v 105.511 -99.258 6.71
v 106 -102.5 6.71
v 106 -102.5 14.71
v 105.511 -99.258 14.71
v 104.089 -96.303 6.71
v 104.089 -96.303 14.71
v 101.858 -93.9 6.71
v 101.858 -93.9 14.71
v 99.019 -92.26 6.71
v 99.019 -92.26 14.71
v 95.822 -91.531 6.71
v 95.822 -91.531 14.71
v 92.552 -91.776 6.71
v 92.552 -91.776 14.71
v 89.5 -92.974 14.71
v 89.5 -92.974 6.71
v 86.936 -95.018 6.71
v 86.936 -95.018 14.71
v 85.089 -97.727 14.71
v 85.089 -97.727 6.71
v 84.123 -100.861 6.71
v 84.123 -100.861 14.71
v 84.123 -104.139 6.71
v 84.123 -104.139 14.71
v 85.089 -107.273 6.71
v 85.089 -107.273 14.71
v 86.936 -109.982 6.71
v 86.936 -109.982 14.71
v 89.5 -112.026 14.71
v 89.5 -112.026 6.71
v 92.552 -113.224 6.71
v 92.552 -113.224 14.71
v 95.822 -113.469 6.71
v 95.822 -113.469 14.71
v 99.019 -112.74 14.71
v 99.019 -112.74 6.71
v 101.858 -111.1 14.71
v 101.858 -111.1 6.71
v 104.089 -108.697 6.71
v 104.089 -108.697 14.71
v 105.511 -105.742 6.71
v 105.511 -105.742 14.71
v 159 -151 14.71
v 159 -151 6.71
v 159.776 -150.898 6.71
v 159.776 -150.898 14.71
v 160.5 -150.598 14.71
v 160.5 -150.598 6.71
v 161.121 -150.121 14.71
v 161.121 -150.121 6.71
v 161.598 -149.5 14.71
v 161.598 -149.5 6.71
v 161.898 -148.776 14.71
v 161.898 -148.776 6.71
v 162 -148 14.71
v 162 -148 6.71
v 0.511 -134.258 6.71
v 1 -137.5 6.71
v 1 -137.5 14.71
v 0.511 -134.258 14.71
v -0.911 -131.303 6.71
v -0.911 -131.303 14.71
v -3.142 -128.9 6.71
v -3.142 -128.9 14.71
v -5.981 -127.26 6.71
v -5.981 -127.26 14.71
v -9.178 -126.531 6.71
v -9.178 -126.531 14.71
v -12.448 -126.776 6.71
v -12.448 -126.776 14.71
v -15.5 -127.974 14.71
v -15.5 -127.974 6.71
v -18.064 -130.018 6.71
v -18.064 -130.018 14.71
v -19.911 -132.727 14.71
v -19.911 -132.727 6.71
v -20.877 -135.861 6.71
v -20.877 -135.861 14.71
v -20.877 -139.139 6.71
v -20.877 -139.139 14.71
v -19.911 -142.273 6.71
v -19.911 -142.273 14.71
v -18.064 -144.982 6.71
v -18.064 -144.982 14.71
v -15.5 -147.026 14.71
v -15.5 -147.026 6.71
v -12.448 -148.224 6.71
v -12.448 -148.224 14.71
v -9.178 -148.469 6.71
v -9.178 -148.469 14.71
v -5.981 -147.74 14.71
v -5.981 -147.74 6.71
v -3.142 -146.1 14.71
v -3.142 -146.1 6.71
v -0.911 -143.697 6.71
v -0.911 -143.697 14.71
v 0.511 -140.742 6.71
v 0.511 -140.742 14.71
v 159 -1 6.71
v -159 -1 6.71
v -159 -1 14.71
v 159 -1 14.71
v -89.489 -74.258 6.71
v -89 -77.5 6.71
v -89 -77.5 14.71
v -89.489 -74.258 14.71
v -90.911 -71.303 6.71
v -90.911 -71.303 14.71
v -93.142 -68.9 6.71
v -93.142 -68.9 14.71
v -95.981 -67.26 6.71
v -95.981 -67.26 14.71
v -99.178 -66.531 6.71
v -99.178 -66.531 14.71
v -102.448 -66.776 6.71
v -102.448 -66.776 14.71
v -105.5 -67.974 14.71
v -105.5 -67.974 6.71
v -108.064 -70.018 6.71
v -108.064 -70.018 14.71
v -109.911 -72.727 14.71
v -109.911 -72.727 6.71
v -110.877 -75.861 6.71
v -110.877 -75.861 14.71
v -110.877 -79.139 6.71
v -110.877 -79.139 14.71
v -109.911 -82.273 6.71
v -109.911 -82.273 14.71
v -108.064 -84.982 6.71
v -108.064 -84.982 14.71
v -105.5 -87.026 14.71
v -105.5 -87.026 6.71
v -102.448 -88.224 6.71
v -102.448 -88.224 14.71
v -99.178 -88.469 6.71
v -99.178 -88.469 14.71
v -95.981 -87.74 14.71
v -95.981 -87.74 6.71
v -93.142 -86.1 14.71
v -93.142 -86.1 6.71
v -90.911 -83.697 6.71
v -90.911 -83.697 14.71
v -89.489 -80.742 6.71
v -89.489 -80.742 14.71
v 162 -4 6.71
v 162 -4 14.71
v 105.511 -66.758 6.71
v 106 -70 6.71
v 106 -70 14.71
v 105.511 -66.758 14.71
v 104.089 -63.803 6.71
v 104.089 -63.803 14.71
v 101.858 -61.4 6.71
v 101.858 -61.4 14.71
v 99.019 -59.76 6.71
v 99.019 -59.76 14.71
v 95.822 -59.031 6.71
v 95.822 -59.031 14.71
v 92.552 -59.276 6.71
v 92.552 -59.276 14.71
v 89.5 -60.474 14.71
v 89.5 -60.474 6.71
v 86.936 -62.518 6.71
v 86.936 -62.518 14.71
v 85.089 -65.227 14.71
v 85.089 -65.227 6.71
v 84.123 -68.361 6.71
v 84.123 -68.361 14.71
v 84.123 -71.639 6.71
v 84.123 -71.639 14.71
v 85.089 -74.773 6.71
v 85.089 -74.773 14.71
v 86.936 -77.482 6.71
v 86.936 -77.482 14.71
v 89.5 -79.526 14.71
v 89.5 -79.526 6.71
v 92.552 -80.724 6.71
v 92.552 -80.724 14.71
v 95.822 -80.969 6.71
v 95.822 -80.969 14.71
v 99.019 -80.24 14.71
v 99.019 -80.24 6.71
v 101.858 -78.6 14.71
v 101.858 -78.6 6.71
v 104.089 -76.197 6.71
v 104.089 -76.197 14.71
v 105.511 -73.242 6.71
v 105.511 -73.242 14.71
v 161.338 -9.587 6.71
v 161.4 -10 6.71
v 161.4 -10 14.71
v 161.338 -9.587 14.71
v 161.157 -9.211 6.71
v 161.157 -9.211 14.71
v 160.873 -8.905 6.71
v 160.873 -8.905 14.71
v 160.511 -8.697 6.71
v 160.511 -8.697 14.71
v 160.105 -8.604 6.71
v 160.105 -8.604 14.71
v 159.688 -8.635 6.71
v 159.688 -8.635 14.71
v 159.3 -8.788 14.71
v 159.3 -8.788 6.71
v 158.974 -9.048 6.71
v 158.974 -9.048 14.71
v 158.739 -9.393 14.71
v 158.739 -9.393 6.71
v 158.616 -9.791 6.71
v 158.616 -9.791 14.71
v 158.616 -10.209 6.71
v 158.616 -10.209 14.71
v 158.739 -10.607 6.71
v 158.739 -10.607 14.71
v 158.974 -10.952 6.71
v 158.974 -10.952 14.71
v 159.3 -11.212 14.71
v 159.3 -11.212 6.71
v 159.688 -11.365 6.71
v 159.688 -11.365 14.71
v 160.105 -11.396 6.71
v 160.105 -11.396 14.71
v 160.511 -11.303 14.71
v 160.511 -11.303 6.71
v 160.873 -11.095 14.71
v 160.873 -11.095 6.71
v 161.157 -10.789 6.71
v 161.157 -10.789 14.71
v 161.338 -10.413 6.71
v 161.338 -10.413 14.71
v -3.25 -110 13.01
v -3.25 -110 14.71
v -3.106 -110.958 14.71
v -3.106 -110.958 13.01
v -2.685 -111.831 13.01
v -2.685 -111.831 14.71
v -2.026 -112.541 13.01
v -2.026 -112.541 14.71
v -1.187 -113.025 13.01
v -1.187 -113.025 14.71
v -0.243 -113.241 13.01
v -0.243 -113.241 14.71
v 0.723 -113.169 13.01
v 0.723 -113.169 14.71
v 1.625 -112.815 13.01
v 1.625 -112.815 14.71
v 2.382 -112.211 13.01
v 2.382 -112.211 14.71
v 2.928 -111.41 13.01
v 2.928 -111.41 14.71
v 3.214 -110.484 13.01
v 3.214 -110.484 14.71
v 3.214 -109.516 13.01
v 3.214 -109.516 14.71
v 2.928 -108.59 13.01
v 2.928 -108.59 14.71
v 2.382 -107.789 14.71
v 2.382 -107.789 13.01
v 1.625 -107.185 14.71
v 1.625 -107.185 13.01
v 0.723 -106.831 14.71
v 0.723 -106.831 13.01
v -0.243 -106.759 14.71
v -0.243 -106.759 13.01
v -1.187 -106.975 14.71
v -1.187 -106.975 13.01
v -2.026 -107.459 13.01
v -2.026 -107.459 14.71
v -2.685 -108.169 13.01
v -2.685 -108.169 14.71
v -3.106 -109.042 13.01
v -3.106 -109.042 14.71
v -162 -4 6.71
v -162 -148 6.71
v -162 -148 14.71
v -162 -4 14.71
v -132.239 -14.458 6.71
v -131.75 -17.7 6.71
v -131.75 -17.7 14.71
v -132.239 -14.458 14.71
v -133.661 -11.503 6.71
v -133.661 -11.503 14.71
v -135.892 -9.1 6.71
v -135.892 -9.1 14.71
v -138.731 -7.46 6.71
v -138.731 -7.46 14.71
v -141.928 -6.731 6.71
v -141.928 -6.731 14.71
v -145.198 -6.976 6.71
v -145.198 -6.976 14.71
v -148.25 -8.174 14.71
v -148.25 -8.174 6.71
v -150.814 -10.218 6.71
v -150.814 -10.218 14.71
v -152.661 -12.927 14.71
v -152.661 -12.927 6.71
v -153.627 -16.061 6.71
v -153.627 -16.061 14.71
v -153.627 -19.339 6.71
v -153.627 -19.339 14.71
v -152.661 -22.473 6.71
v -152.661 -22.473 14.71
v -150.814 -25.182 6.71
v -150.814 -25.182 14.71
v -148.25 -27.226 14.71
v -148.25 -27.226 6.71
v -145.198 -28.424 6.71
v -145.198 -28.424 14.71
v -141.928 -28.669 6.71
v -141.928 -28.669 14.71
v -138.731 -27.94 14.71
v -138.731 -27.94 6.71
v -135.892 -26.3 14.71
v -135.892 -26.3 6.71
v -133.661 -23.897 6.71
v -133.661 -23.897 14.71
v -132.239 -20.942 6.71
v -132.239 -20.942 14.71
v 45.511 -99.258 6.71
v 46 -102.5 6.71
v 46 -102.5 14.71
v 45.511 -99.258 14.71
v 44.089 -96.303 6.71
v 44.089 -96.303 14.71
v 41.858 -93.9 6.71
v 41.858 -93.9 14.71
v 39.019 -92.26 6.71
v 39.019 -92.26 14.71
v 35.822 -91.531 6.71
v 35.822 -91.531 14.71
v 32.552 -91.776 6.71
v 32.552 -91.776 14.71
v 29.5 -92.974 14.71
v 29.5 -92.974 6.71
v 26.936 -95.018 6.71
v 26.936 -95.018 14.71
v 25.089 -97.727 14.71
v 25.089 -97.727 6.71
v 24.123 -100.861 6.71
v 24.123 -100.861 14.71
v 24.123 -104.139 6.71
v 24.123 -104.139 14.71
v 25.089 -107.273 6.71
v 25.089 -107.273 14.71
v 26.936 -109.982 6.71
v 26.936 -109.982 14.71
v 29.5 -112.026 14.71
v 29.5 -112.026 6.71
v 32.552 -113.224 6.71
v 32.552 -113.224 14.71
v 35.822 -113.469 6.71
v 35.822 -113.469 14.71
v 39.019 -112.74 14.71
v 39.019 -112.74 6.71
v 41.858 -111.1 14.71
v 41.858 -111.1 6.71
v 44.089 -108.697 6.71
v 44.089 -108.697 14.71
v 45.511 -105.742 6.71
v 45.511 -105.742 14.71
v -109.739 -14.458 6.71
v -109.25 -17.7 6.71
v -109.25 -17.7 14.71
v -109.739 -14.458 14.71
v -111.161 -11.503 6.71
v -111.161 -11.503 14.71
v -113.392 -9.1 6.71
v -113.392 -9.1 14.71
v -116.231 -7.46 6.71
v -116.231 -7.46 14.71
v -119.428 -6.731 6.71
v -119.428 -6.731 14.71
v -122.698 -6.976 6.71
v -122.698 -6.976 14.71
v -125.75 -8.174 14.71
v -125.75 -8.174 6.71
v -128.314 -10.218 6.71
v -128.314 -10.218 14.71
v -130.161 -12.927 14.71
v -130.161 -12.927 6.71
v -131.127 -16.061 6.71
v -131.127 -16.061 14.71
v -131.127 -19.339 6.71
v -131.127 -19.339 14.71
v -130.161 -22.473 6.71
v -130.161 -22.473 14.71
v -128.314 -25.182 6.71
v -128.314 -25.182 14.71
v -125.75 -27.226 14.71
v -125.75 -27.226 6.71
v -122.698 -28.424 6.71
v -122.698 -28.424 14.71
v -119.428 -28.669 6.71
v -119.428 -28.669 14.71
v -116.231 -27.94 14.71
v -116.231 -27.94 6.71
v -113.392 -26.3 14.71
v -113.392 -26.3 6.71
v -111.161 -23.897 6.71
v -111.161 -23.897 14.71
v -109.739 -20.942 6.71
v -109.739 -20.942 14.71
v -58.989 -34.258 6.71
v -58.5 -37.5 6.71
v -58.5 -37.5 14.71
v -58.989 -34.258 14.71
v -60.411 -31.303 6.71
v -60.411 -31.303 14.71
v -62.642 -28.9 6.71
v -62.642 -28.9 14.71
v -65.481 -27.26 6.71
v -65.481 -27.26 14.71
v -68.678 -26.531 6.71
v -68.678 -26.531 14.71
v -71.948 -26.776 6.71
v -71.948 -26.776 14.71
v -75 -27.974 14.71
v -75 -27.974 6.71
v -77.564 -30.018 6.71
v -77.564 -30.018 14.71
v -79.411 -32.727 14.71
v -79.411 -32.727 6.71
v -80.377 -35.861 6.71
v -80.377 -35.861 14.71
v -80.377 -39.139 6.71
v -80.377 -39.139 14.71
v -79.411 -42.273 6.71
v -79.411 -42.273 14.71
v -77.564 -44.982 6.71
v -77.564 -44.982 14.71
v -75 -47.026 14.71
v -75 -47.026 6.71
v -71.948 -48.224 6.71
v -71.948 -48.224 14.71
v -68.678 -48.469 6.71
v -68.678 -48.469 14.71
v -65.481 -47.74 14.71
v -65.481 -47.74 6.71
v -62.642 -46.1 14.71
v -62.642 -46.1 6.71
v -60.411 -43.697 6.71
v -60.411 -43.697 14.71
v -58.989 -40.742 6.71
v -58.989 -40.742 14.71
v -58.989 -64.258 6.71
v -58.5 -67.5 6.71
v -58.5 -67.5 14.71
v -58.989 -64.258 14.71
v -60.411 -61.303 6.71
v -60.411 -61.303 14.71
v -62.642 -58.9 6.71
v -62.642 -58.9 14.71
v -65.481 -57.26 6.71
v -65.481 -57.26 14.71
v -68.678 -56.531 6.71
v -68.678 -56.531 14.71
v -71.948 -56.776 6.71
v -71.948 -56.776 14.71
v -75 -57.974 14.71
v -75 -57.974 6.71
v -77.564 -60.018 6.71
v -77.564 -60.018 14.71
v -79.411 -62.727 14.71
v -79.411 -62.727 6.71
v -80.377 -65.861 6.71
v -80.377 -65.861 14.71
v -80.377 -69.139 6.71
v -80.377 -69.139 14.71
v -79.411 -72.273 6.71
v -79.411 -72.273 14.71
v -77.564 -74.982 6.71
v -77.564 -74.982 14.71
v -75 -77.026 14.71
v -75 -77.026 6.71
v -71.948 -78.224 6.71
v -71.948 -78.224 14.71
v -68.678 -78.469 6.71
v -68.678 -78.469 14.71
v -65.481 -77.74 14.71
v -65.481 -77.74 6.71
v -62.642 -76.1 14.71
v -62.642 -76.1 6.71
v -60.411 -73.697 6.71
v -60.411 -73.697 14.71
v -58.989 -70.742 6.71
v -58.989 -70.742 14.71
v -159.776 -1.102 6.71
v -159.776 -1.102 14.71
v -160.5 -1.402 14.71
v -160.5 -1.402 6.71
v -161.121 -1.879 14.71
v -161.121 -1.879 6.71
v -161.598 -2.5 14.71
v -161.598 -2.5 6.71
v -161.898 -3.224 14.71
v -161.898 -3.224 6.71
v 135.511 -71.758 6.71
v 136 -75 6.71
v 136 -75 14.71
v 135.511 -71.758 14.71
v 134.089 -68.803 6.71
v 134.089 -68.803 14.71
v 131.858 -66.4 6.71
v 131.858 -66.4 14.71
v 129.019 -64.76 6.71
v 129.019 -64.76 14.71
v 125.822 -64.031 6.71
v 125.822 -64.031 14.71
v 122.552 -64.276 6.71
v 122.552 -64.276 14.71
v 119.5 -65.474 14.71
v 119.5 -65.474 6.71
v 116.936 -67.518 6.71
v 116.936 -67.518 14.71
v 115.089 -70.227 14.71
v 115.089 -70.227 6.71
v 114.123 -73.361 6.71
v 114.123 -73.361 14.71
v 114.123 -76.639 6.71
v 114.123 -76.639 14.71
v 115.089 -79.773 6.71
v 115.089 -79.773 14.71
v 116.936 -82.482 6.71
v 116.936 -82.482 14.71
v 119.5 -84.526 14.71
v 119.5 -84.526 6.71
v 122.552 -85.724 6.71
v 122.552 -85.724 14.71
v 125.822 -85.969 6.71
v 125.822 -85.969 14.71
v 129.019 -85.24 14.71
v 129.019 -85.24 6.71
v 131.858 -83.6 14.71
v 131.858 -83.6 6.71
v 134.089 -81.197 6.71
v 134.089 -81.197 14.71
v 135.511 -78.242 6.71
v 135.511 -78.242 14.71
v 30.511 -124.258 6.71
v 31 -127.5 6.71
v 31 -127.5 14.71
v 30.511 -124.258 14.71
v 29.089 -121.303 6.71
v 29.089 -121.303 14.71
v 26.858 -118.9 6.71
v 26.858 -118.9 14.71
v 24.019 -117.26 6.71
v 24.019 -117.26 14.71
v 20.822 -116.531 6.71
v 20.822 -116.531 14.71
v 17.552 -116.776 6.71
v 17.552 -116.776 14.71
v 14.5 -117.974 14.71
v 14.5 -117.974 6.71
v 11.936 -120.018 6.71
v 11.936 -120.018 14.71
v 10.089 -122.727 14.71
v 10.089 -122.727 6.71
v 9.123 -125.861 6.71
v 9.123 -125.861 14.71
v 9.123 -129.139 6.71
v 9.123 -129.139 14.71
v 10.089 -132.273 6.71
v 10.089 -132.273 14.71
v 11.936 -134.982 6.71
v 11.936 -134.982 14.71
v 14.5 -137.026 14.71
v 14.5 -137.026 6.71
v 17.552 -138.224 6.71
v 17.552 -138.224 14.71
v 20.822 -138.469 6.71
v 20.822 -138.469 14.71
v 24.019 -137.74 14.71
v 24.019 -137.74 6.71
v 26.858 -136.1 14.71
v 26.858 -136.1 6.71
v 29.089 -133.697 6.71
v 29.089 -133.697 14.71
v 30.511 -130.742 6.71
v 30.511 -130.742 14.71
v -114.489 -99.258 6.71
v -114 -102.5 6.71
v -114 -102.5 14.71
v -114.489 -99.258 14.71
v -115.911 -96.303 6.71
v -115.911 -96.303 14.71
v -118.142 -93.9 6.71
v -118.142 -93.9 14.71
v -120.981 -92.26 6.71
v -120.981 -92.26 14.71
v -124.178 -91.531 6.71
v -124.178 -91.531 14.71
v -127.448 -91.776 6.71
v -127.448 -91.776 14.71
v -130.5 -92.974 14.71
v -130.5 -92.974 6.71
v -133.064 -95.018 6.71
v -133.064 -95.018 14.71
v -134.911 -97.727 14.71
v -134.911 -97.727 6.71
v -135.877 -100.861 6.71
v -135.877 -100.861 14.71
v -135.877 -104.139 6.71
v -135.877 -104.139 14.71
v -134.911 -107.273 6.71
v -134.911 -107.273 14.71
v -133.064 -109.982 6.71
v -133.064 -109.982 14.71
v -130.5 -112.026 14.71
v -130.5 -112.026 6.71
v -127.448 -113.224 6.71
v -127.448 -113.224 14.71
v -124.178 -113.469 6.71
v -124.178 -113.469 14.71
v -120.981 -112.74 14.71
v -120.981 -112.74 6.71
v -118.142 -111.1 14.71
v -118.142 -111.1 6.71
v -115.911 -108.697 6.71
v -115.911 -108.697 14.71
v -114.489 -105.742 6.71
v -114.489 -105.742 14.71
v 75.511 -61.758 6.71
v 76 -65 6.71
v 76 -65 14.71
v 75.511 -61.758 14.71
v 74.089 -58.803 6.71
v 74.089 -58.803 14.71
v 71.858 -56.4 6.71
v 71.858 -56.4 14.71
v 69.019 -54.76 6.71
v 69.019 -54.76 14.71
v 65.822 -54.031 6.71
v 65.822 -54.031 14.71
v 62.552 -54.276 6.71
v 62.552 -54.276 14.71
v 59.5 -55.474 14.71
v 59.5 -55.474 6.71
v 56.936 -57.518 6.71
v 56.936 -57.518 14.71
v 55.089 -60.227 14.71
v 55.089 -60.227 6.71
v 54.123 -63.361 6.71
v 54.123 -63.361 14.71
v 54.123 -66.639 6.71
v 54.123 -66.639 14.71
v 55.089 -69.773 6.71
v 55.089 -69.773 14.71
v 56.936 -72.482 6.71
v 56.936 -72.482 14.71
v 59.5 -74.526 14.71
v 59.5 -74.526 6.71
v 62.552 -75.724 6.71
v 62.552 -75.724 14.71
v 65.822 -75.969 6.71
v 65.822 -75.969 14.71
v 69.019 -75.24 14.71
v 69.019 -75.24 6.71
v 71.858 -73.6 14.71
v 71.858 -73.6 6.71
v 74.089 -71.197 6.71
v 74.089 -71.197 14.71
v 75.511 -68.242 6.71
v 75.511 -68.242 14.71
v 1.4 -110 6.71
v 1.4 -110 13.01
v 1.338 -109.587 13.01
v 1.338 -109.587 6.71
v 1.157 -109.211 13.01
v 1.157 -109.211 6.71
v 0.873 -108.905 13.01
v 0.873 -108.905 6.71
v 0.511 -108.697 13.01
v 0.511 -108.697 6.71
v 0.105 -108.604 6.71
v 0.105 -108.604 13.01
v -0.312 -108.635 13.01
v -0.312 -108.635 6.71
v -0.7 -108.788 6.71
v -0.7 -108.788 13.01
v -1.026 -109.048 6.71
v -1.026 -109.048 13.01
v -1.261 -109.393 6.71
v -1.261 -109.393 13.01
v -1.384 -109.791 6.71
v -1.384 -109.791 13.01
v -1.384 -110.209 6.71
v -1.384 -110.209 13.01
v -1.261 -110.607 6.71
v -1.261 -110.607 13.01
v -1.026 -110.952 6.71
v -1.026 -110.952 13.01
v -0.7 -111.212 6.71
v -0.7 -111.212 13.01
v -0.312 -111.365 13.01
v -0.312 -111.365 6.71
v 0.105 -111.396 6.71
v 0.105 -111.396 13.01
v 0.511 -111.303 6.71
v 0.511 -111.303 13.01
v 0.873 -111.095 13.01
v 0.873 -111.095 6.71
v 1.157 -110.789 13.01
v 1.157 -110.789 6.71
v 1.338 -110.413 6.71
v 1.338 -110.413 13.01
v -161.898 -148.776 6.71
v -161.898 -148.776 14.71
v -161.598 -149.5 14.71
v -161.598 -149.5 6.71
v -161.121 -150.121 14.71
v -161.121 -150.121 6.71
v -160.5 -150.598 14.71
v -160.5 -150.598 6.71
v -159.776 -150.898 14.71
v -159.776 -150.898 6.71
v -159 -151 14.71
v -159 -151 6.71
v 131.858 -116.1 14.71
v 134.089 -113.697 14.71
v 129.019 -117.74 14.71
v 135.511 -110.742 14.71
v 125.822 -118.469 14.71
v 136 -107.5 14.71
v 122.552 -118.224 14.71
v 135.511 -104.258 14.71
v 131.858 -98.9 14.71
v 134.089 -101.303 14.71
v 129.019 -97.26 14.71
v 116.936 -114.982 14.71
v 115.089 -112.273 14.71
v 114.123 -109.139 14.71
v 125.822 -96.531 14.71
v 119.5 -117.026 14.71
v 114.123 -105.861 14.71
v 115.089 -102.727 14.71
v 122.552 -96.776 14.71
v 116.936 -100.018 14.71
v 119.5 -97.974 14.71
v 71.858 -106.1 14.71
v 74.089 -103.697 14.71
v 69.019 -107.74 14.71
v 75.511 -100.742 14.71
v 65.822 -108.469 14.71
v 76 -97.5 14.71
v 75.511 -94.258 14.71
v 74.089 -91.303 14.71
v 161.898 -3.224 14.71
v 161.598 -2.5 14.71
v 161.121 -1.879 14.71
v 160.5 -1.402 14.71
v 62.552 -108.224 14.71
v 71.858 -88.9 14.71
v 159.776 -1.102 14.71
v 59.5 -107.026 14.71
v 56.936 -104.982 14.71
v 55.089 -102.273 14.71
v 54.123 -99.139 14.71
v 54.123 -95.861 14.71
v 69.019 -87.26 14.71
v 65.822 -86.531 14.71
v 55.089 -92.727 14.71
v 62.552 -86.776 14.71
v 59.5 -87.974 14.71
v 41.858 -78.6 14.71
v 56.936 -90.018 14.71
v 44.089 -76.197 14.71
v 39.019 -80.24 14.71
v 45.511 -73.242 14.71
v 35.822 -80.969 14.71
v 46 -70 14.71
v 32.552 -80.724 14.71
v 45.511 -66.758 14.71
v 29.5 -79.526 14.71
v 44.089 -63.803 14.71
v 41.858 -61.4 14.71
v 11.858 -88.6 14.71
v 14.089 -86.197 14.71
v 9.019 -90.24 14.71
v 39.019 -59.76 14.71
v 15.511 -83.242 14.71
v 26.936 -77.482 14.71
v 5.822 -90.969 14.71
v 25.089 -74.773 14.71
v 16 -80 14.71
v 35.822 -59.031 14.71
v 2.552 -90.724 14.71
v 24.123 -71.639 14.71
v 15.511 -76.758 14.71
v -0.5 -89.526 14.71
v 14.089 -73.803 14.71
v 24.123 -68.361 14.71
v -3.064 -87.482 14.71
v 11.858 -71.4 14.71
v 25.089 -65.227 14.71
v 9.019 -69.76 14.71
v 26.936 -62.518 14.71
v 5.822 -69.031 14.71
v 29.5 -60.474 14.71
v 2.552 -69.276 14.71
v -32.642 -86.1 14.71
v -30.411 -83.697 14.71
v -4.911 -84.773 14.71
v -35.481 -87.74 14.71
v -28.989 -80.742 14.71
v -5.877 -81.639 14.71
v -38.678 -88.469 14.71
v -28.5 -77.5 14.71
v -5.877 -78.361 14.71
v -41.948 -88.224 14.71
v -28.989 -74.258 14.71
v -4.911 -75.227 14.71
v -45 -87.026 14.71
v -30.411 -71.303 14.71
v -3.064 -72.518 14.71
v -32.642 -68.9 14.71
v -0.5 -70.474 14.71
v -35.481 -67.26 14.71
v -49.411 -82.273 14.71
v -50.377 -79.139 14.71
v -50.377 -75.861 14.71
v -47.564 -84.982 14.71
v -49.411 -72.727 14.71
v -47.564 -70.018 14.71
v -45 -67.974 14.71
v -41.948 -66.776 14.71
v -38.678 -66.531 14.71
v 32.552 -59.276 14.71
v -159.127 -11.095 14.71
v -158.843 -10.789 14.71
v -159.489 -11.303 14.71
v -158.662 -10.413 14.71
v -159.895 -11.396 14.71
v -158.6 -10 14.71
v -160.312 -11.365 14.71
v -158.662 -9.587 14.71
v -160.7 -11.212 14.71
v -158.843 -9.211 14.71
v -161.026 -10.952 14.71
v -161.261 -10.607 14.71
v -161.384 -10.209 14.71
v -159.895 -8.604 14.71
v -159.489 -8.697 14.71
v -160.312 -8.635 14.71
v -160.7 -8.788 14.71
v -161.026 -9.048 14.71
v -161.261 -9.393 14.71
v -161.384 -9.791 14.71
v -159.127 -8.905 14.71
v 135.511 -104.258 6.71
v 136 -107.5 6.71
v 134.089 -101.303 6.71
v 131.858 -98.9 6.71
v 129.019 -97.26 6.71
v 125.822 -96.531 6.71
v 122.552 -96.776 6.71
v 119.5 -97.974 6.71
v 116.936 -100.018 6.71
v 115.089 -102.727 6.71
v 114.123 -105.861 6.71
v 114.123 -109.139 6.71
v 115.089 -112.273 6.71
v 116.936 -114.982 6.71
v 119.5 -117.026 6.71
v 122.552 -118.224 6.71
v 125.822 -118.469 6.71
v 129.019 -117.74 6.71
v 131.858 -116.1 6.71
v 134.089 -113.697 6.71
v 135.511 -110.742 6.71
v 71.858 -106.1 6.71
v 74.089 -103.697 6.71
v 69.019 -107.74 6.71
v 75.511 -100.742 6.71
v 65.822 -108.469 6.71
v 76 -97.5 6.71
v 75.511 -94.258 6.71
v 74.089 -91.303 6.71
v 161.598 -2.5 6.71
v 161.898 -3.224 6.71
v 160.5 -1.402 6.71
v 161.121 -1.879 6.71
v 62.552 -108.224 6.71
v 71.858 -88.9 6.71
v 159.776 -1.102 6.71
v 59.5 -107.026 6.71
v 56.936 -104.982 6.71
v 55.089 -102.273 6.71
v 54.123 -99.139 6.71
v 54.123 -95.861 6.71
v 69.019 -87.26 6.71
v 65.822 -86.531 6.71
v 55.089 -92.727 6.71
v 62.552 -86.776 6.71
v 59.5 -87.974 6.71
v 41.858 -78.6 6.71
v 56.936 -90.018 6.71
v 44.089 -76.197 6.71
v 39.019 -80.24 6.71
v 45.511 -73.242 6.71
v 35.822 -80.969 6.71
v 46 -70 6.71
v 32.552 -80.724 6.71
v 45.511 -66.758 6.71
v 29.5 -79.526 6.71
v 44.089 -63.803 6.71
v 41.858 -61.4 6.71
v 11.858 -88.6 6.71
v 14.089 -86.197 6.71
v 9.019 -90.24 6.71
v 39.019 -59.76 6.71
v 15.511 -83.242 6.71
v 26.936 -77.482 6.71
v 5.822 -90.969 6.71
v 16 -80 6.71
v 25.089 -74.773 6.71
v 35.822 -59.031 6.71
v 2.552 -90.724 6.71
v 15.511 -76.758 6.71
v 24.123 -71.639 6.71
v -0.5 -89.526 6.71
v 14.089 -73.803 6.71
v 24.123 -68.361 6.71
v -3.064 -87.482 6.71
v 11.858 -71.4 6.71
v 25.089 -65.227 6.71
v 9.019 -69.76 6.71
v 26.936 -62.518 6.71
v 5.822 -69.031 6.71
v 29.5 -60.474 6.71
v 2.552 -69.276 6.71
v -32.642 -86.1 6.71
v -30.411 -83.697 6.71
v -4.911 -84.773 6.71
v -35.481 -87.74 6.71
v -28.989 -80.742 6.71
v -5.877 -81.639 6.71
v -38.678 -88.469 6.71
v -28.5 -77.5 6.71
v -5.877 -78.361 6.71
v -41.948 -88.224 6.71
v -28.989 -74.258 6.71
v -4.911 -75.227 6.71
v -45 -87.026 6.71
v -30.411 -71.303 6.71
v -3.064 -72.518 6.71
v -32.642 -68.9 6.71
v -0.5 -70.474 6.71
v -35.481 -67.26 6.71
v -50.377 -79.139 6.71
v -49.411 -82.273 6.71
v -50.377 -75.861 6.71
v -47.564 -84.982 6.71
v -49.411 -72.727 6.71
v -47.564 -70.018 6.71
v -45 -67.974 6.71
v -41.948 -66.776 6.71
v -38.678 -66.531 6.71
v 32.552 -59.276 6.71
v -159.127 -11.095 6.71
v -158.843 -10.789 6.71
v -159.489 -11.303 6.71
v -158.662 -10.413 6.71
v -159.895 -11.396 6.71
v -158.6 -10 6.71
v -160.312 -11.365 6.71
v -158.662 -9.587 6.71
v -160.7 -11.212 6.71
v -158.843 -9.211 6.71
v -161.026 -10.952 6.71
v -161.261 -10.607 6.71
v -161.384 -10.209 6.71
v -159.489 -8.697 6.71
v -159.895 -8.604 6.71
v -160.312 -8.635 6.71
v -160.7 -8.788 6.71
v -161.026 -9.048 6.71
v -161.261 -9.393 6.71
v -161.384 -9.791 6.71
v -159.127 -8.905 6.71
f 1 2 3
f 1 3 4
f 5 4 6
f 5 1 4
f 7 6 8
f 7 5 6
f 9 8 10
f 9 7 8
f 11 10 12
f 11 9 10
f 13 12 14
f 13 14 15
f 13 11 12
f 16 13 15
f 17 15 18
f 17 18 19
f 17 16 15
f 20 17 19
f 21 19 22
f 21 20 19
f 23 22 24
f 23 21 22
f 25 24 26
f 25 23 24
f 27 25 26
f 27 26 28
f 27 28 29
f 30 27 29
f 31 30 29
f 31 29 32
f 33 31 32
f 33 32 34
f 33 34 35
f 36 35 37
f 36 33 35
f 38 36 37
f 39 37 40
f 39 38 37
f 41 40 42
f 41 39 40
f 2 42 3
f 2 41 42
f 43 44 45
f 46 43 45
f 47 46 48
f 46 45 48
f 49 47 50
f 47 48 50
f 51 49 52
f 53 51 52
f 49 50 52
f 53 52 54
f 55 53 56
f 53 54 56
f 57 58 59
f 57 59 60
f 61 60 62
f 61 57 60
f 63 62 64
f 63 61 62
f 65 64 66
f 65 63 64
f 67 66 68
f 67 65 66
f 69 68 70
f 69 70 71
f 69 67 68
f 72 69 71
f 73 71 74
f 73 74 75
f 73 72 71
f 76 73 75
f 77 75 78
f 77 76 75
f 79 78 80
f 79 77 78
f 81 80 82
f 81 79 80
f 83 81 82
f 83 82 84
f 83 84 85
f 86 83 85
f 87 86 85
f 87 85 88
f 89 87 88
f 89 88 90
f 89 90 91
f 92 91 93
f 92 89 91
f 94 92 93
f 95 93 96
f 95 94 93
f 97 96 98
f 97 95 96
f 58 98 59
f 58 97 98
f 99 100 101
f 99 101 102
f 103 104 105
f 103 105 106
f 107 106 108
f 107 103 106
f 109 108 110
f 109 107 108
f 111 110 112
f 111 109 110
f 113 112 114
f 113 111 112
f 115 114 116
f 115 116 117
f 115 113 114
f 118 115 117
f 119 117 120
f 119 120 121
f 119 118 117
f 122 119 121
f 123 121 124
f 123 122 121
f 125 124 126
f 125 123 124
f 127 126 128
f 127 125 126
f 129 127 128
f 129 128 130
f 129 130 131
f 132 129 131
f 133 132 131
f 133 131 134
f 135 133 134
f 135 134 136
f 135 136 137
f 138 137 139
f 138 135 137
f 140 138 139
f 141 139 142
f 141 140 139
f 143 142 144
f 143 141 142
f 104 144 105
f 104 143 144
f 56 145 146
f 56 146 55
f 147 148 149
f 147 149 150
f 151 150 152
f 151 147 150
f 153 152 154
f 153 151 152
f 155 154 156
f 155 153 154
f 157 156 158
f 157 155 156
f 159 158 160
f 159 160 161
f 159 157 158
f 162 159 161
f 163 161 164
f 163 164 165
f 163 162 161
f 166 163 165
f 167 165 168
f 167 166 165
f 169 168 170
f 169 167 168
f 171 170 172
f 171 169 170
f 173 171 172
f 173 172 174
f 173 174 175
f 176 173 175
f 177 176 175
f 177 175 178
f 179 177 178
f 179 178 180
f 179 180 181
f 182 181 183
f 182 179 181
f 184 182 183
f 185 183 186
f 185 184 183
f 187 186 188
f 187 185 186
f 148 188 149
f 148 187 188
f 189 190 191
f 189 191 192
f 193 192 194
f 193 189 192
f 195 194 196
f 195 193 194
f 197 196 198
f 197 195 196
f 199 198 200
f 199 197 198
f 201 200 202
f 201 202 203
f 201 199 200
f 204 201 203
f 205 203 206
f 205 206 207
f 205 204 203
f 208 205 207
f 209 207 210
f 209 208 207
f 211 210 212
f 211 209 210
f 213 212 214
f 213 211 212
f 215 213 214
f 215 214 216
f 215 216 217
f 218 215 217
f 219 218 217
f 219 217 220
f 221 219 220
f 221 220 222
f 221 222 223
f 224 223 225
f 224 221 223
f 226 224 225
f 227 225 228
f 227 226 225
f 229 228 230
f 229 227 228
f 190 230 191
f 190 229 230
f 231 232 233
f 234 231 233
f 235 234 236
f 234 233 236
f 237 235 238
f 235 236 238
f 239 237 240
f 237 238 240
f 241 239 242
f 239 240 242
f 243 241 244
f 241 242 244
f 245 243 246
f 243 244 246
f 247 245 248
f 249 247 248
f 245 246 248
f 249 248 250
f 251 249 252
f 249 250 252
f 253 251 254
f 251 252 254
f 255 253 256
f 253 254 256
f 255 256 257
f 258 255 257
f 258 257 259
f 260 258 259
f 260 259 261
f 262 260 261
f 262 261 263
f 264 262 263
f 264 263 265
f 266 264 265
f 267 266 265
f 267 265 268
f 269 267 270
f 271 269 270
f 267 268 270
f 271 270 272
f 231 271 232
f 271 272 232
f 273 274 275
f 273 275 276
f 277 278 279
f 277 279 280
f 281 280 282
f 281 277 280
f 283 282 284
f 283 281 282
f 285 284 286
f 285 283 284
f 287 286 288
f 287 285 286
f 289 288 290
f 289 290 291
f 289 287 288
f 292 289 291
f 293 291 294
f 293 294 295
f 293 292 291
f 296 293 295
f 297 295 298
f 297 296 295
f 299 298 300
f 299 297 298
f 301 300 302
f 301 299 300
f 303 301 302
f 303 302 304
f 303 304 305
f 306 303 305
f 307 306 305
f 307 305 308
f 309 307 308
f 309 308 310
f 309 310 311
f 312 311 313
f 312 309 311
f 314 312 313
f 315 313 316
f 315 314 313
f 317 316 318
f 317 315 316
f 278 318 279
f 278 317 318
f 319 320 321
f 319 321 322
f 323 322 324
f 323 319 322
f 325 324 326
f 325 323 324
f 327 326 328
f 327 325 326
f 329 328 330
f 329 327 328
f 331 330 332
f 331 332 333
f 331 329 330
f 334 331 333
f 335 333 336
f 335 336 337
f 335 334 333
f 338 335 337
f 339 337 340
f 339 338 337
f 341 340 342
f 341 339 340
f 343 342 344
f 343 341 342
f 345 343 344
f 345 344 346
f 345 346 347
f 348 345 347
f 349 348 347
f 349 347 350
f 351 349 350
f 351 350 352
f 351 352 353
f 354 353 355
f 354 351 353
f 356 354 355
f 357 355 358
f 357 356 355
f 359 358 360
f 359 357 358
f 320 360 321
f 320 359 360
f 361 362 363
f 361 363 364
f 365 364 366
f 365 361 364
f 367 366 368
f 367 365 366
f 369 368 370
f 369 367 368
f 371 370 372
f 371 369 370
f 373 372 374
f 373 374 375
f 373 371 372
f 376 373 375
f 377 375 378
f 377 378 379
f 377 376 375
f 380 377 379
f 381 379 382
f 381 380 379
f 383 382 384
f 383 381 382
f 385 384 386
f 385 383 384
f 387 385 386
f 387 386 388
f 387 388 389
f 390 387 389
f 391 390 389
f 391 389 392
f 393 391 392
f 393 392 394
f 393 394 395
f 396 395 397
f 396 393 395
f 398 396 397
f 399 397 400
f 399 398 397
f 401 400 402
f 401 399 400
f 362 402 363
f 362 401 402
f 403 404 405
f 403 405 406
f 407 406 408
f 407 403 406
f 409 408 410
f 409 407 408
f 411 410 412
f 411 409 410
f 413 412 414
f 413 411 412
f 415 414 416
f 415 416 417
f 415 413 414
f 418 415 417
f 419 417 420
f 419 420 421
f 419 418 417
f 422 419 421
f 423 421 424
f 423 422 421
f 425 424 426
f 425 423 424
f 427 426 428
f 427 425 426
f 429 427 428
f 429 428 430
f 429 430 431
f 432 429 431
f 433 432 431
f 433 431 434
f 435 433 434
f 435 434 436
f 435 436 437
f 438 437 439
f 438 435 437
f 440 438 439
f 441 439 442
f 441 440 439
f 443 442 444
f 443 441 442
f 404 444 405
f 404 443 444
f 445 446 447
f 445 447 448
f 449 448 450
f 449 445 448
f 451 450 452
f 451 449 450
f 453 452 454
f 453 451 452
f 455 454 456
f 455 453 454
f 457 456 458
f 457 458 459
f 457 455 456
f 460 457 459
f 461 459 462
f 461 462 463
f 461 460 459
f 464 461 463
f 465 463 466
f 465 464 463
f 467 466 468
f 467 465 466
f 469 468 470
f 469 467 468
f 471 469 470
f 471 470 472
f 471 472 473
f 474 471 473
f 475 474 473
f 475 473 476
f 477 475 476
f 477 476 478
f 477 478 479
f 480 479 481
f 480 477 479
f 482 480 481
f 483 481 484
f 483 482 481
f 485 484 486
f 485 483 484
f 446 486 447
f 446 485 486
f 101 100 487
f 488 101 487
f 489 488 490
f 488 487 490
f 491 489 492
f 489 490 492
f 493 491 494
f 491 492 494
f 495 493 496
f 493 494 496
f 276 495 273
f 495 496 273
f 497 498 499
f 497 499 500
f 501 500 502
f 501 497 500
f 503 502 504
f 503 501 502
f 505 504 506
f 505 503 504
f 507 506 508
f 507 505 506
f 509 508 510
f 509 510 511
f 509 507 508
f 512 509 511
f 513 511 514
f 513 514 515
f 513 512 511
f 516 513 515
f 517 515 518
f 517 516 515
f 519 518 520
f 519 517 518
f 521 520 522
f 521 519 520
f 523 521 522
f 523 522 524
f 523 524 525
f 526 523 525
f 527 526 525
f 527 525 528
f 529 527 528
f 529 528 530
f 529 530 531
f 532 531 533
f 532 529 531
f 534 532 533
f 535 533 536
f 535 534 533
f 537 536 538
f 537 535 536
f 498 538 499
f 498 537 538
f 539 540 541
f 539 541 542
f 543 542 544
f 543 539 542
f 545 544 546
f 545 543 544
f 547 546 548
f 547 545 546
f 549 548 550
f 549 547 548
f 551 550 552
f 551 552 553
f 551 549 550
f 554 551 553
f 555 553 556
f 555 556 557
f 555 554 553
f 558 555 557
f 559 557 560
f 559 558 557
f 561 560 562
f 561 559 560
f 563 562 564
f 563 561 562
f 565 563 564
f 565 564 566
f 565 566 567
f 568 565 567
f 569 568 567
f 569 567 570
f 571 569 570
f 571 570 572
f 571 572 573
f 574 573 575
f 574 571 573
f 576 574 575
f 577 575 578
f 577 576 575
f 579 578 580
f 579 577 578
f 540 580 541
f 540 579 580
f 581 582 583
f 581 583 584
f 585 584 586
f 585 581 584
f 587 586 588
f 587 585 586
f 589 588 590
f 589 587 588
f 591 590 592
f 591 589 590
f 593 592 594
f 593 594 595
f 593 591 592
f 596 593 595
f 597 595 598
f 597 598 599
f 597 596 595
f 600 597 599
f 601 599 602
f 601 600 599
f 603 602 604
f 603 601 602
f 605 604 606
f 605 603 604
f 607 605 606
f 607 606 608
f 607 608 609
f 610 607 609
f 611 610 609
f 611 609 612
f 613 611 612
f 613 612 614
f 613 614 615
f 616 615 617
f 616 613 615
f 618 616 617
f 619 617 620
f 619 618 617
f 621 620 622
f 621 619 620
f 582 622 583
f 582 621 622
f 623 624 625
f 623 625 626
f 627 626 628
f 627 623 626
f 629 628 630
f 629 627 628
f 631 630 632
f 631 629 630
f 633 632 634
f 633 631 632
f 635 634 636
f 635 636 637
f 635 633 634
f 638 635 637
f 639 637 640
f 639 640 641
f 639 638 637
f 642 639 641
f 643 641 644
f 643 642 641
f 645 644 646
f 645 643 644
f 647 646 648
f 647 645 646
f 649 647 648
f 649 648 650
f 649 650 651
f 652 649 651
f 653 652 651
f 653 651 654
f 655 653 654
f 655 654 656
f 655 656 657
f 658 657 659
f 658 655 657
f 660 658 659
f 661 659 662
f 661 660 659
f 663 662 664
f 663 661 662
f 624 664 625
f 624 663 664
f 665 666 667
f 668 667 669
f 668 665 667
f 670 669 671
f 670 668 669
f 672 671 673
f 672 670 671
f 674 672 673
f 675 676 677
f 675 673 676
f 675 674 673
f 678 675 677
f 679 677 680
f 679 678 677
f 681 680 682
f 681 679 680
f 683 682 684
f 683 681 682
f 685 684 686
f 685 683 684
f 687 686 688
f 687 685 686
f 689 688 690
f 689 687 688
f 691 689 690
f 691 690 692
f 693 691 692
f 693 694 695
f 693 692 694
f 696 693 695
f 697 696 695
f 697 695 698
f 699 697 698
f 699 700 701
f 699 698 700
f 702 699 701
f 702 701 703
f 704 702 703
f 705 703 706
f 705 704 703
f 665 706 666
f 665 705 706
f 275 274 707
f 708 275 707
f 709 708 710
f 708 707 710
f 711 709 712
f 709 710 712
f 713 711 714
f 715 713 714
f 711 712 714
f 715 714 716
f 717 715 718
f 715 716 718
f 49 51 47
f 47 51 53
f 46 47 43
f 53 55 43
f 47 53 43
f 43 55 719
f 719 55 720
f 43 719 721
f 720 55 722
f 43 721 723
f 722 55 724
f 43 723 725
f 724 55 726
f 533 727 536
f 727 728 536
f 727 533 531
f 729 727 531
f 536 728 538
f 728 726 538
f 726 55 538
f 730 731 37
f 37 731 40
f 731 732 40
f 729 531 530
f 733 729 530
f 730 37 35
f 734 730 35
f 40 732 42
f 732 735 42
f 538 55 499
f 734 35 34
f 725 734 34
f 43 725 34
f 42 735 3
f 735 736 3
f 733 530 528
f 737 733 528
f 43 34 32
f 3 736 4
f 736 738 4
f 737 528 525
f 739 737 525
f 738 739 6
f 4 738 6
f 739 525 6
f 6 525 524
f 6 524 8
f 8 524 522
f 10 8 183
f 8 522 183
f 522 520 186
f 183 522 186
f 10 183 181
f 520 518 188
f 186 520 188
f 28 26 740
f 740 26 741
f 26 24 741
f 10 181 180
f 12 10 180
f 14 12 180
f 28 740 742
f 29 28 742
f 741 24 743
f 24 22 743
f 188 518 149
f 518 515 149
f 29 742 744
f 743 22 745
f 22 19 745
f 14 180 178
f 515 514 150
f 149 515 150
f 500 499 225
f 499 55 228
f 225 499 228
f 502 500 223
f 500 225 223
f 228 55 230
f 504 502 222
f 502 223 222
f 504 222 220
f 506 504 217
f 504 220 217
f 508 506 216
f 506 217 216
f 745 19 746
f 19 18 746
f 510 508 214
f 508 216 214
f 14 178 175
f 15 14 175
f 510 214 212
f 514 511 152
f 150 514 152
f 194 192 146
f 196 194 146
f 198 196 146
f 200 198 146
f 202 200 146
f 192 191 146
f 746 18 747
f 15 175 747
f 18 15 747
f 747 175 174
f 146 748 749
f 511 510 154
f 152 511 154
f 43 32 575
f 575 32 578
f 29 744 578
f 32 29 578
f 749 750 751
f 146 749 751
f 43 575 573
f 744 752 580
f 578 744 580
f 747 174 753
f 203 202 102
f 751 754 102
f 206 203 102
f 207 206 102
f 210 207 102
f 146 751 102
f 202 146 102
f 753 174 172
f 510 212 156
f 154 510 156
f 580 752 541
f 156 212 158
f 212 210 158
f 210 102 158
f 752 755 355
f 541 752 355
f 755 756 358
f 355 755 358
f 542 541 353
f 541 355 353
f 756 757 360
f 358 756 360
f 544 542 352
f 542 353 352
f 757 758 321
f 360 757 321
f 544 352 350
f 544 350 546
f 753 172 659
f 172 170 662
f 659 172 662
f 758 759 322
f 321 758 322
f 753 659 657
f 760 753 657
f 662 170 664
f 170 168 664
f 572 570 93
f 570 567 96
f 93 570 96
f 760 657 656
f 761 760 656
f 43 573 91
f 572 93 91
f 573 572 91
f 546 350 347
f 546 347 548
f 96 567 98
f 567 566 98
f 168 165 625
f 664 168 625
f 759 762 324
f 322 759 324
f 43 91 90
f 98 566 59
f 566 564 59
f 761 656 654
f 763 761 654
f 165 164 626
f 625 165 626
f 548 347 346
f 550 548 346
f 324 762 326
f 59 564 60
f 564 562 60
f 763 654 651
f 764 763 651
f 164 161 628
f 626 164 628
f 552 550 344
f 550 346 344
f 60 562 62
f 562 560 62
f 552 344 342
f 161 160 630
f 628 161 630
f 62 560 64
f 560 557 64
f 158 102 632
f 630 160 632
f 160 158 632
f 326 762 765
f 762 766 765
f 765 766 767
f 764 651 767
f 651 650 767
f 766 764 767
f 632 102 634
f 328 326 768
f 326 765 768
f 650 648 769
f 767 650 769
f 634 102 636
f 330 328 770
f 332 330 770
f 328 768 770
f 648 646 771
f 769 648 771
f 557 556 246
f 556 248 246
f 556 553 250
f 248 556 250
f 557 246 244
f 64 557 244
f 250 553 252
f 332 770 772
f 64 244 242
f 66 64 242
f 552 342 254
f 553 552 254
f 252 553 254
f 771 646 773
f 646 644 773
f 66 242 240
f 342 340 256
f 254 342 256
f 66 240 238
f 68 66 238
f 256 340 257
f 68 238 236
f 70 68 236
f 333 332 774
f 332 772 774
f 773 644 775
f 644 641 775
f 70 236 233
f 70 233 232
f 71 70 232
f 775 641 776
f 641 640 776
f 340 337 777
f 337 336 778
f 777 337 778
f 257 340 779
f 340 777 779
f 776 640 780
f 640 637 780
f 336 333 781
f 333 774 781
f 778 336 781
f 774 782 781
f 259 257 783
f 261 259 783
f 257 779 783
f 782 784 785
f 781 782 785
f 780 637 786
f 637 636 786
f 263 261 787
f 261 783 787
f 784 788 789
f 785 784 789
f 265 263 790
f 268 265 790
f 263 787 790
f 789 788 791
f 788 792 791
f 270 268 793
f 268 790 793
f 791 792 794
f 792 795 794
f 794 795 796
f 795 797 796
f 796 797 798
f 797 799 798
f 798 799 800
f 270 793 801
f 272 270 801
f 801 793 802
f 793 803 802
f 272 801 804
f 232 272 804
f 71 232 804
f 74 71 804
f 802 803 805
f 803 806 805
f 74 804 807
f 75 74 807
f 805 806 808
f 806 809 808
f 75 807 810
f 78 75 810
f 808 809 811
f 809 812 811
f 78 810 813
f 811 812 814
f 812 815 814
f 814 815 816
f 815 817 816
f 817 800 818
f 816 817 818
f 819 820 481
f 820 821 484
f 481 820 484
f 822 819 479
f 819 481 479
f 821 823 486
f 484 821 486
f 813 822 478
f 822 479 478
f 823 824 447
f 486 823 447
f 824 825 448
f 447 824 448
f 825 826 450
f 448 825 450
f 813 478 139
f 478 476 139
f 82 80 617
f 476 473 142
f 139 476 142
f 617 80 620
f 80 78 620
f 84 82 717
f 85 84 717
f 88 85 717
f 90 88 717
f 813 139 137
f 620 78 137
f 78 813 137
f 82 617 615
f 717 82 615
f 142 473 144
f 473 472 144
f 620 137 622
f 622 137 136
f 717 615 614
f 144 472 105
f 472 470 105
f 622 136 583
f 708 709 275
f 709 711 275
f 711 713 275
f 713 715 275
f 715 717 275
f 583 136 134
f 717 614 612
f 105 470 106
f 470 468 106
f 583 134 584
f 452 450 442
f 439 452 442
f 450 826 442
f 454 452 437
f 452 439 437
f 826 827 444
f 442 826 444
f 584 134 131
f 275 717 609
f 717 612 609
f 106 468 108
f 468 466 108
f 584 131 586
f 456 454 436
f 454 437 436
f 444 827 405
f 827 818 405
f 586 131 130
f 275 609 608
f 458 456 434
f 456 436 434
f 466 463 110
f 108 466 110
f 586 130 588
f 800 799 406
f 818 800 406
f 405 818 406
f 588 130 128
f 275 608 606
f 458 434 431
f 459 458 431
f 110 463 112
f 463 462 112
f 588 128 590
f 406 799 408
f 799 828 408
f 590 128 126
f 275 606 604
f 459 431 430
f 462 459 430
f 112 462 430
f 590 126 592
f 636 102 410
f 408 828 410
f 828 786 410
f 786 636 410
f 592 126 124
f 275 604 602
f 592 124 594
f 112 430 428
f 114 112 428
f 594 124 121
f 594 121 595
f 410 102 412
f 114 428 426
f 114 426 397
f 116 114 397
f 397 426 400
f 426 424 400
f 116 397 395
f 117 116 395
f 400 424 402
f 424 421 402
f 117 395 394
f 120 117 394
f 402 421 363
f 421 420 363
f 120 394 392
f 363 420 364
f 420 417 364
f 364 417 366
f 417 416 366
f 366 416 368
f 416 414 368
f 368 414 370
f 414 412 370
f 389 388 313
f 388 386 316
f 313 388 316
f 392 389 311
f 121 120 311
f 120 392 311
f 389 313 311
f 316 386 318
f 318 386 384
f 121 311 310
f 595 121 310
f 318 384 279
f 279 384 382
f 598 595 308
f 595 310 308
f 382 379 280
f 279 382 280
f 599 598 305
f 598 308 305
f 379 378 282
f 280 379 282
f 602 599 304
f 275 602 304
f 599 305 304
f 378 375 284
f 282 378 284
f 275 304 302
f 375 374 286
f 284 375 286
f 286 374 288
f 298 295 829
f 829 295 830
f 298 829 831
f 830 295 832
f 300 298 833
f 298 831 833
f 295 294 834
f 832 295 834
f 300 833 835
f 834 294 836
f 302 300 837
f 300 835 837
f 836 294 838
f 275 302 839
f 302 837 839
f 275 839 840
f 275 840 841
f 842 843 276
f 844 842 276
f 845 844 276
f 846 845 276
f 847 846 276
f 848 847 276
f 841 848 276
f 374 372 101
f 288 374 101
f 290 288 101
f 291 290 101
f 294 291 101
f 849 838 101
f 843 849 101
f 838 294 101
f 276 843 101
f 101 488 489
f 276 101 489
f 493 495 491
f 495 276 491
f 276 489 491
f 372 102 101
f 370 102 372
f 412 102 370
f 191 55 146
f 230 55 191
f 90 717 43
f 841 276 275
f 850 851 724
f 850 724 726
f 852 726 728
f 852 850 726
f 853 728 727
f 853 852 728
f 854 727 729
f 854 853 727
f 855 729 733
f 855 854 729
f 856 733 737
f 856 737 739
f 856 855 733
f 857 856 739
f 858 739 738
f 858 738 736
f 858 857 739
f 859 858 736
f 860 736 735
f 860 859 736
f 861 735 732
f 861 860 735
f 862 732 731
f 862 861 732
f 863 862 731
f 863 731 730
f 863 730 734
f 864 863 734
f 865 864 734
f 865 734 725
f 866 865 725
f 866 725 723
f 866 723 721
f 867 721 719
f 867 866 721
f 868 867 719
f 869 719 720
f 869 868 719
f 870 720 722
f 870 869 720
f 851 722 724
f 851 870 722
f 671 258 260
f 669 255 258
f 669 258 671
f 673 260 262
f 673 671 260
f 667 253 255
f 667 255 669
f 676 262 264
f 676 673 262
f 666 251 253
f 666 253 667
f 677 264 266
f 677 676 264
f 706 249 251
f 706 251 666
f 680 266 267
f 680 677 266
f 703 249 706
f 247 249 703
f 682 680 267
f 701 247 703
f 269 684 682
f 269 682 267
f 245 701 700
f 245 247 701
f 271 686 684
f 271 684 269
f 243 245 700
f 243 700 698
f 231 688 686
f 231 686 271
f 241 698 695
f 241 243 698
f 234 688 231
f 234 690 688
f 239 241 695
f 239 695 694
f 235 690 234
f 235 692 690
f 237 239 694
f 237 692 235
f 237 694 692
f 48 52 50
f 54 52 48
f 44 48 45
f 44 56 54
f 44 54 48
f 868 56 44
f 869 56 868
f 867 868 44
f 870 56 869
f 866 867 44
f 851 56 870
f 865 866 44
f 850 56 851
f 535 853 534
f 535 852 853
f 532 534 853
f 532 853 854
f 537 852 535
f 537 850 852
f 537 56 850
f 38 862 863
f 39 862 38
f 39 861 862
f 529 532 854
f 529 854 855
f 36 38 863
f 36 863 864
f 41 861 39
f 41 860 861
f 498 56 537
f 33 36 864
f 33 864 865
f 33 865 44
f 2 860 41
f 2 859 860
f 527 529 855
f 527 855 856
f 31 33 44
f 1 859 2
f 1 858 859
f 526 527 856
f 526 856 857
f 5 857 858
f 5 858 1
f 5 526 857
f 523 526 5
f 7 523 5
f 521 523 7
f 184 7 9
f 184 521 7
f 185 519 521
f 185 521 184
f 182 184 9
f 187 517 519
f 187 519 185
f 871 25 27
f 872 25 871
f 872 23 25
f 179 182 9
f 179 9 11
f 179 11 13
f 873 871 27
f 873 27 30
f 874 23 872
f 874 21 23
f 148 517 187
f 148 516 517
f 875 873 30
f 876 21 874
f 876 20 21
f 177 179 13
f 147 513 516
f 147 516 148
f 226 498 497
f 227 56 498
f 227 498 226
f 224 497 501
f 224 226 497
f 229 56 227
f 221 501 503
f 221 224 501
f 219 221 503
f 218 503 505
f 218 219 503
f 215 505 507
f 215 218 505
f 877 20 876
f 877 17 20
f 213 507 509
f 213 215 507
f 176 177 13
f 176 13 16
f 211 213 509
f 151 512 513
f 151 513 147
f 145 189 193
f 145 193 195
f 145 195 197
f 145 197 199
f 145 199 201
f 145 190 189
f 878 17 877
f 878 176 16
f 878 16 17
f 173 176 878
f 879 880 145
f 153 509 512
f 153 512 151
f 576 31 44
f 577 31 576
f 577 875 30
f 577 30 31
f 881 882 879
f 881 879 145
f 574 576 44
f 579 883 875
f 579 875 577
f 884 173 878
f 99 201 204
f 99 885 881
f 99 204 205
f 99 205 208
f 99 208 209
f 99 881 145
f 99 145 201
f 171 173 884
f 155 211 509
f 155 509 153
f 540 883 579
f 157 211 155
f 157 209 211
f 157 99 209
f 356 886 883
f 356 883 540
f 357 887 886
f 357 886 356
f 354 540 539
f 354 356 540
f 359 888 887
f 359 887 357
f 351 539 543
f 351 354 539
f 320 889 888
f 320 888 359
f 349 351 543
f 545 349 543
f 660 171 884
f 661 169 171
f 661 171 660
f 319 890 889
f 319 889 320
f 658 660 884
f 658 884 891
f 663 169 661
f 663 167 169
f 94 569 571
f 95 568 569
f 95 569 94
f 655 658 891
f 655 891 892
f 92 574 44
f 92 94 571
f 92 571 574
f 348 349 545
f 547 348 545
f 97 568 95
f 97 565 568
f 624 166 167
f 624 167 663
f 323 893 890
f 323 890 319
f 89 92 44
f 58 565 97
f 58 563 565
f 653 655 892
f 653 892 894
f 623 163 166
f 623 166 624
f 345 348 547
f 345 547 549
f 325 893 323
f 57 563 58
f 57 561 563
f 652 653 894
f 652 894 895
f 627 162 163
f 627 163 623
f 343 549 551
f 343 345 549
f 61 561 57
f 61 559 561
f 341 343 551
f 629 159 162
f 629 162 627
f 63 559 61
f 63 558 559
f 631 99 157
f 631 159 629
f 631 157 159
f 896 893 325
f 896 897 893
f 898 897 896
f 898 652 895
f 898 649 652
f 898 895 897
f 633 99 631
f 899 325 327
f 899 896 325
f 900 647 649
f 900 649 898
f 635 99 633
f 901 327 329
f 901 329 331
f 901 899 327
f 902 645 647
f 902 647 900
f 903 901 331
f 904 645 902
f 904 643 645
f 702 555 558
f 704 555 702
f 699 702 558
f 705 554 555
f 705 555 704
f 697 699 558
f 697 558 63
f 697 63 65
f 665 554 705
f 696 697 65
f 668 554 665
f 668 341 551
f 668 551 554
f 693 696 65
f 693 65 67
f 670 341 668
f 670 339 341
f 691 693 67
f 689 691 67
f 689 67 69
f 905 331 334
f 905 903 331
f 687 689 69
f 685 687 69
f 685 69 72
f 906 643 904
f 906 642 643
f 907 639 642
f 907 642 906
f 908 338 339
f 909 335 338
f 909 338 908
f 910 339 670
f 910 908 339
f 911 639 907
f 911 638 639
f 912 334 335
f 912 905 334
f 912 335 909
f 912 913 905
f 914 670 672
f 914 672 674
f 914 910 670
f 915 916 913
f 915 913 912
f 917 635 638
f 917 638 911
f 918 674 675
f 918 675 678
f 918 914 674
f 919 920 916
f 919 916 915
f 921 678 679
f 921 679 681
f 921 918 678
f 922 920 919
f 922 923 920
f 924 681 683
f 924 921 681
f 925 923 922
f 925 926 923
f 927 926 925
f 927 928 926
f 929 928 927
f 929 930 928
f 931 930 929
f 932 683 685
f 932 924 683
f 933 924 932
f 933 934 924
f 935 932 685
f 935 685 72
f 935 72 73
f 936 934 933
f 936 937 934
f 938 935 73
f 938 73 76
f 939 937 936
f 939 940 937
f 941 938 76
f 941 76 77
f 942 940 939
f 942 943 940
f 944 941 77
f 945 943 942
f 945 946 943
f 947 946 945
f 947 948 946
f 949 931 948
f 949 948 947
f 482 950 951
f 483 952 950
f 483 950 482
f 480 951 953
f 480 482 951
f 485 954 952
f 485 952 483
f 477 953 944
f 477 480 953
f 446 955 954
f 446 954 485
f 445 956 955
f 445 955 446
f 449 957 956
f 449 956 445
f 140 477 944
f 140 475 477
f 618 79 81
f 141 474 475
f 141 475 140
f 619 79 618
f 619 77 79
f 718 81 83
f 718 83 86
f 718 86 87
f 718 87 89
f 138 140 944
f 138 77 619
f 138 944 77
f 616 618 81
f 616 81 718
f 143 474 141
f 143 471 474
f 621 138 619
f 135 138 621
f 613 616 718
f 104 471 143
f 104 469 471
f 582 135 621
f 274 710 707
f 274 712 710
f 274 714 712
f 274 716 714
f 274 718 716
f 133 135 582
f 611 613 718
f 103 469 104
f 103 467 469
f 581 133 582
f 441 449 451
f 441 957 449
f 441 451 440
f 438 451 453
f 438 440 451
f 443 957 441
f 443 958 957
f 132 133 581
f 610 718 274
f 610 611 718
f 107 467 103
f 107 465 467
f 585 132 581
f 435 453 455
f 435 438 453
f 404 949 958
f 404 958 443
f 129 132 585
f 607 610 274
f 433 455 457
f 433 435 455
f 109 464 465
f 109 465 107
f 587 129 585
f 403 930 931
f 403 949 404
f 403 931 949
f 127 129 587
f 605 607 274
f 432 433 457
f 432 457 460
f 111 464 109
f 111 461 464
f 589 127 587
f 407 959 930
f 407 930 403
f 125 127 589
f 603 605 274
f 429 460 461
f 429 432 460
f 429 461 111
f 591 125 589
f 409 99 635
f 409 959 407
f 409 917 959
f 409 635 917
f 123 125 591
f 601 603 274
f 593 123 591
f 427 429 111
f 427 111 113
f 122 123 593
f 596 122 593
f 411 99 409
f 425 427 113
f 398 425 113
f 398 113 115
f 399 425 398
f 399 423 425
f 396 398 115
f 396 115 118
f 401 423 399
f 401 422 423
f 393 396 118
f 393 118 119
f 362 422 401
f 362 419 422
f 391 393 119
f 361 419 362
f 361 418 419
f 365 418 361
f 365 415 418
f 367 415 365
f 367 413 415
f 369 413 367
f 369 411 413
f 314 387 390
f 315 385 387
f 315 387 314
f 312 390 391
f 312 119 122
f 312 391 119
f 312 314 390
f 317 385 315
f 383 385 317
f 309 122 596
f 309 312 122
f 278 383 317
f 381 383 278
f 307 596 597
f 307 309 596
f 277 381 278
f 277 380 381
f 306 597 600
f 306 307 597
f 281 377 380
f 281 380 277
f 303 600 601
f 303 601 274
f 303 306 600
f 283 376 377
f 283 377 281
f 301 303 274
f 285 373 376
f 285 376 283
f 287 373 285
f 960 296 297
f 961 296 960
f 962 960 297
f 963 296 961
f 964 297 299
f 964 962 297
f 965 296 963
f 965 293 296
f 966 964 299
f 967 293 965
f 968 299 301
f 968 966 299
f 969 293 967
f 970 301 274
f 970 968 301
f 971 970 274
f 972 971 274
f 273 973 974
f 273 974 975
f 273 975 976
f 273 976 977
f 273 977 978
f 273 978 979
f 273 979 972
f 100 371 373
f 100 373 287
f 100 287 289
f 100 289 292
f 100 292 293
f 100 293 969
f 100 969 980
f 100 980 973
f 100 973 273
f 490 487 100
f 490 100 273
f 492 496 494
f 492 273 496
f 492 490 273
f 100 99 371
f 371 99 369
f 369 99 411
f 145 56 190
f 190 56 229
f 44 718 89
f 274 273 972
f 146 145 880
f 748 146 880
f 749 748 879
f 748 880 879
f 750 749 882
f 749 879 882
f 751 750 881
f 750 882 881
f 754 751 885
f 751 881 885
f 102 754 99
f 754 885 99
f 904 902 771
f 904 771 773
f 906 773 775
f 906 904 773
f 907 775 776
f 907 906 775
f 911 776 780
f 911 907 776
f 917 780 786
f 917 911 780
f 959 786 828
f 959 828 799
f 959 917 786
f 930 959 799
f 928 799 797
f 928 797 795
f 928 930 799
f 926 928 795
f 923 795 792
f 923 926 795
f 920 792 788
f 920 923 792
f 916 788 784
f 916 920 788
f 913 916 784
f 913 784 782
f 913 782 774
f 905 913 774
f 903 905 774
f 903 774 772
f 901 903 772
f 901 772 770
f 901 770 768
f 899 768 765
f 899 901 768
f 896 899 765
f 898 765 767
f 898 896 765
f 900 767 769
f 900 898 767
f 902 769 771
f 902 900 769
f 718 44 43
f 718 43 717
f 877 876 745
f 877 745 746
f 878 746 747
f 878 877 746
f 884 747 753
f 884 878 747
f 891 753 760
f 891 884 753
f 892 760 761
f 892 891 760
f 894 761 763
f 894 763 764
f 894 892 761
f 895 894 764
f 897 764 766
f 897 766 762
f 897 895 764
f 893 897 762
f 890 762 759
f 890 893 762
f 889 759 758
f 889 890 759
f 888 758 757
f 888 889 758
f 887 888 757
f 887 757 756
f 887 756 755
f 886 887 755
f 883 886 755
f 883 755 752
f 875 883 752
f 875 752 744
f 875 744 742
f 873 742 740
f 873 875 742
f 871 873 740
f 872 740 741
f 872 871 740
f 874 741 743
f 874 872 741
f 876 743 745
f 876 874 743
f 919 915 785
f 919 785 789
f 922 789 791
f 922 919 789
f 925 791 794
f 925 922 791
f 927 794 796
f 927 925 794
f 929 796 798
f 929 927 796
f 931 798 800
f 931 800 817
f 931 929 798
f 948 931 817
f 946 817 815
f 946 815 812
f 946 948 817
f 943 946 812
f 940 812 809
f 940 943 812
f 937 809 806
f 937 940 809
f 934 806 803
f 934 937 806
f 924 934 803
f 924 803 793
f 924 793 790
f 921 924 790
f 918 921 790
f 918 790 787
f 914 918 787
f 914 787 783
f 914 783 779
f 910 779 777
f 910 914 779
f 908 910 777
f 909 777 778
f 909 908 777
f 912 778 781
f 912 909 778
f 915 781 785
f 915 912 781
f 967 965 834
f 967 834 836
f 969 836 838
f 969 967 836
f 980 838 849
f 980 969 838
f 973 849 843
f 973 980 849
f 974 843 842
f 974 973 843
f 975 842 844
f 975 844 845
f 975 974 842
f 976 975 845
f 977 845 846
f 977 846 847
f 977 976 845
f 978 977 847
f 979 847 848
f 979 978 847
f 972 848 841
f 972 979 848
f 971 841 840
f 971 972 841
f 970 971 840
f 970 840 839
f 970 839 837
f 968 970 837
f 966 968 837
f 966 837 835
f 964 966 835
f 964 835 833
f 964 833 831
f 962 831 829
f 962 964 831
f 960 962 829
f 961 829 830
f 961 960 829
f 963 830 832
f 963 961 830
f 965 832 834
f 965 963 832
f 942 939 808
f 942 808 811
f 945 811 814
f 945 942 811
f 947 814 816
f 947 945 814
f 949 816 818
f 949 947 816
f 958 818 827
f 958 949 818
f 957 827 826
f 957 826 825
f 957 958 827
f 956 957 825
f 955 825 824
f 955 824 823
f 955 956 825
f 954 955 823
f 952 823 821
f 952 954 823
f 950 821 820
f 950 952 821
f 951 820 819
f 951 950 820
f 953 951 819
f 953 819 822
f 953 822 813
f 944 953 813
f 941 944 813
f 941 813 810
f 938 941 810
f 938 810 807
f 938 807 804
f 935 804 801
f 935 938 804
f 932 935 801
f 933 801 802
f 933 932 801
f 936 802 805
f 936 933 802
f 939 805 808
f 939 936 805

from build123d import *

# Parameters (mm, degrees)
PAD002_DEPTH  = 8
SKETCH008_R   = 11
HOLE001_DEPTH = 8
SKETCH009_R   = 1.4
HOLE002_DEPTH = 8
SKETCH010_R   = 3.25
HOLE003_DEPTH = 1.7


with BuildPart() as part:
    # Sketch007 → Pad002 (new body)
    with BuildSketch(Plane.XY):
        with BuildLine():
            Line((-159, -1), (159, -1))
            ThreePointArc((162, -4), (161.12132, -1.87868), (159, -1))
            Line((162, -4), (162, -148))
            ThreePointArc((159, -151), (161.12132, -150.12132), (162, -148))
            Line((159, -151), (-159, -151))
            ThreePointArc((-162, -148), (-161.12132, -150.12132), (-159, -151))
            Line((-162, -148), (-162, -4))
            ThreePointArc((-159, -1), (-161.12132, -1.87868), (-162, -4))
        make_face()
    extrude(amount=PAD002_DEPTH)

    # Sketch008 → Hole001 (cut)
    with BuildSketch(Plane.XY):
        with Locations((-142.75, -17.7)):
            Circle(SKETCH008_R)
        with Locations((-120.25, -17.7)):
            Circle(SKETCH008_R)
        with Locations((-69.5, -37.5)):
            Circle(SKETCH008_R)
        with Locations((-69.5, -67.5)):
            Circle(SKETCH008_R)
        with Locations((-100, -77.5)):
            Circle(SKETCH008_R)
        with Locations((-125, -102.5)):
            Circle(SKETCH008_R)
        with Locations((-39.5, -77.5)):
            Circle(SKETCH008_R)
        with Locations((5, -80)):
            Circle(SKETCH008_R)
        with Locations((35, -70)):
            Circle(SKETCH008_R)
        with Locations((65, -65)):
            Circle(SKETCH008_R)
        with Locations((95, -70)):
            Circle(SKETCH008_R)
        with Locations((125, -75)):
            Circle(SKETCH008_R)
        with Locations((-10, -137.5)):
            Circle(SKETCH008_R)
        with Locations((20, -127.5)):
            Circle(SKETCH008_R)
        with Locations((35, -102.5)):
            Circle(SKETCH008_R)
        with Locations((65, -97.5)):
            Circle(SKETCH008_R)
        with Locations((95, -102.5)):
            Circle(SKETCH008_R)
        with Locations((125, -107.5)):
            Circle(SKETCH008_R)
    extrude(amount=HOLE001_DEPTH, mode=Mode.SUBTRACT)

    # Sketch009 → Hole002 (cut)
    with BuildSketch(Plane.XY):
        with Locations((0, -210)):
            Circle(SKETCH009_R)
        with Locations((160, -210)):
            Circle(SKETCH009_R)
        with Locations((160, -10)):
            Circle(SKETCH009_R)
        with Locations((-160, -210)):
            Circle(SKETCH009_R)
        with Locations((-160, -10)):
            Circle(SKETCH009_R)
        with Locations((0, -110)):
            Circle(SKETCH009_R)
    extrude(amount=HOLE002_DEPTH, mode=Mode.SUBTRACT)

    # Sketch010 → Hole003 (cut)
    with BuildSketch(Plane(origin=(0, 0, 8), x_dir=(-1, 0, 0), z_dir=(0, 0, 1))):
        with Locations((0, 110)):
            Circle(SKETCH010_R)
    extrude(amount=-HOLE003_DEPTH, mode=Mode.SUBTRACT)


with BuildPart() as part_1:
    # Body001 placement: moved
    add(part.part.moved(Location((0, 0, 6.71))))


solid = part_1.part
